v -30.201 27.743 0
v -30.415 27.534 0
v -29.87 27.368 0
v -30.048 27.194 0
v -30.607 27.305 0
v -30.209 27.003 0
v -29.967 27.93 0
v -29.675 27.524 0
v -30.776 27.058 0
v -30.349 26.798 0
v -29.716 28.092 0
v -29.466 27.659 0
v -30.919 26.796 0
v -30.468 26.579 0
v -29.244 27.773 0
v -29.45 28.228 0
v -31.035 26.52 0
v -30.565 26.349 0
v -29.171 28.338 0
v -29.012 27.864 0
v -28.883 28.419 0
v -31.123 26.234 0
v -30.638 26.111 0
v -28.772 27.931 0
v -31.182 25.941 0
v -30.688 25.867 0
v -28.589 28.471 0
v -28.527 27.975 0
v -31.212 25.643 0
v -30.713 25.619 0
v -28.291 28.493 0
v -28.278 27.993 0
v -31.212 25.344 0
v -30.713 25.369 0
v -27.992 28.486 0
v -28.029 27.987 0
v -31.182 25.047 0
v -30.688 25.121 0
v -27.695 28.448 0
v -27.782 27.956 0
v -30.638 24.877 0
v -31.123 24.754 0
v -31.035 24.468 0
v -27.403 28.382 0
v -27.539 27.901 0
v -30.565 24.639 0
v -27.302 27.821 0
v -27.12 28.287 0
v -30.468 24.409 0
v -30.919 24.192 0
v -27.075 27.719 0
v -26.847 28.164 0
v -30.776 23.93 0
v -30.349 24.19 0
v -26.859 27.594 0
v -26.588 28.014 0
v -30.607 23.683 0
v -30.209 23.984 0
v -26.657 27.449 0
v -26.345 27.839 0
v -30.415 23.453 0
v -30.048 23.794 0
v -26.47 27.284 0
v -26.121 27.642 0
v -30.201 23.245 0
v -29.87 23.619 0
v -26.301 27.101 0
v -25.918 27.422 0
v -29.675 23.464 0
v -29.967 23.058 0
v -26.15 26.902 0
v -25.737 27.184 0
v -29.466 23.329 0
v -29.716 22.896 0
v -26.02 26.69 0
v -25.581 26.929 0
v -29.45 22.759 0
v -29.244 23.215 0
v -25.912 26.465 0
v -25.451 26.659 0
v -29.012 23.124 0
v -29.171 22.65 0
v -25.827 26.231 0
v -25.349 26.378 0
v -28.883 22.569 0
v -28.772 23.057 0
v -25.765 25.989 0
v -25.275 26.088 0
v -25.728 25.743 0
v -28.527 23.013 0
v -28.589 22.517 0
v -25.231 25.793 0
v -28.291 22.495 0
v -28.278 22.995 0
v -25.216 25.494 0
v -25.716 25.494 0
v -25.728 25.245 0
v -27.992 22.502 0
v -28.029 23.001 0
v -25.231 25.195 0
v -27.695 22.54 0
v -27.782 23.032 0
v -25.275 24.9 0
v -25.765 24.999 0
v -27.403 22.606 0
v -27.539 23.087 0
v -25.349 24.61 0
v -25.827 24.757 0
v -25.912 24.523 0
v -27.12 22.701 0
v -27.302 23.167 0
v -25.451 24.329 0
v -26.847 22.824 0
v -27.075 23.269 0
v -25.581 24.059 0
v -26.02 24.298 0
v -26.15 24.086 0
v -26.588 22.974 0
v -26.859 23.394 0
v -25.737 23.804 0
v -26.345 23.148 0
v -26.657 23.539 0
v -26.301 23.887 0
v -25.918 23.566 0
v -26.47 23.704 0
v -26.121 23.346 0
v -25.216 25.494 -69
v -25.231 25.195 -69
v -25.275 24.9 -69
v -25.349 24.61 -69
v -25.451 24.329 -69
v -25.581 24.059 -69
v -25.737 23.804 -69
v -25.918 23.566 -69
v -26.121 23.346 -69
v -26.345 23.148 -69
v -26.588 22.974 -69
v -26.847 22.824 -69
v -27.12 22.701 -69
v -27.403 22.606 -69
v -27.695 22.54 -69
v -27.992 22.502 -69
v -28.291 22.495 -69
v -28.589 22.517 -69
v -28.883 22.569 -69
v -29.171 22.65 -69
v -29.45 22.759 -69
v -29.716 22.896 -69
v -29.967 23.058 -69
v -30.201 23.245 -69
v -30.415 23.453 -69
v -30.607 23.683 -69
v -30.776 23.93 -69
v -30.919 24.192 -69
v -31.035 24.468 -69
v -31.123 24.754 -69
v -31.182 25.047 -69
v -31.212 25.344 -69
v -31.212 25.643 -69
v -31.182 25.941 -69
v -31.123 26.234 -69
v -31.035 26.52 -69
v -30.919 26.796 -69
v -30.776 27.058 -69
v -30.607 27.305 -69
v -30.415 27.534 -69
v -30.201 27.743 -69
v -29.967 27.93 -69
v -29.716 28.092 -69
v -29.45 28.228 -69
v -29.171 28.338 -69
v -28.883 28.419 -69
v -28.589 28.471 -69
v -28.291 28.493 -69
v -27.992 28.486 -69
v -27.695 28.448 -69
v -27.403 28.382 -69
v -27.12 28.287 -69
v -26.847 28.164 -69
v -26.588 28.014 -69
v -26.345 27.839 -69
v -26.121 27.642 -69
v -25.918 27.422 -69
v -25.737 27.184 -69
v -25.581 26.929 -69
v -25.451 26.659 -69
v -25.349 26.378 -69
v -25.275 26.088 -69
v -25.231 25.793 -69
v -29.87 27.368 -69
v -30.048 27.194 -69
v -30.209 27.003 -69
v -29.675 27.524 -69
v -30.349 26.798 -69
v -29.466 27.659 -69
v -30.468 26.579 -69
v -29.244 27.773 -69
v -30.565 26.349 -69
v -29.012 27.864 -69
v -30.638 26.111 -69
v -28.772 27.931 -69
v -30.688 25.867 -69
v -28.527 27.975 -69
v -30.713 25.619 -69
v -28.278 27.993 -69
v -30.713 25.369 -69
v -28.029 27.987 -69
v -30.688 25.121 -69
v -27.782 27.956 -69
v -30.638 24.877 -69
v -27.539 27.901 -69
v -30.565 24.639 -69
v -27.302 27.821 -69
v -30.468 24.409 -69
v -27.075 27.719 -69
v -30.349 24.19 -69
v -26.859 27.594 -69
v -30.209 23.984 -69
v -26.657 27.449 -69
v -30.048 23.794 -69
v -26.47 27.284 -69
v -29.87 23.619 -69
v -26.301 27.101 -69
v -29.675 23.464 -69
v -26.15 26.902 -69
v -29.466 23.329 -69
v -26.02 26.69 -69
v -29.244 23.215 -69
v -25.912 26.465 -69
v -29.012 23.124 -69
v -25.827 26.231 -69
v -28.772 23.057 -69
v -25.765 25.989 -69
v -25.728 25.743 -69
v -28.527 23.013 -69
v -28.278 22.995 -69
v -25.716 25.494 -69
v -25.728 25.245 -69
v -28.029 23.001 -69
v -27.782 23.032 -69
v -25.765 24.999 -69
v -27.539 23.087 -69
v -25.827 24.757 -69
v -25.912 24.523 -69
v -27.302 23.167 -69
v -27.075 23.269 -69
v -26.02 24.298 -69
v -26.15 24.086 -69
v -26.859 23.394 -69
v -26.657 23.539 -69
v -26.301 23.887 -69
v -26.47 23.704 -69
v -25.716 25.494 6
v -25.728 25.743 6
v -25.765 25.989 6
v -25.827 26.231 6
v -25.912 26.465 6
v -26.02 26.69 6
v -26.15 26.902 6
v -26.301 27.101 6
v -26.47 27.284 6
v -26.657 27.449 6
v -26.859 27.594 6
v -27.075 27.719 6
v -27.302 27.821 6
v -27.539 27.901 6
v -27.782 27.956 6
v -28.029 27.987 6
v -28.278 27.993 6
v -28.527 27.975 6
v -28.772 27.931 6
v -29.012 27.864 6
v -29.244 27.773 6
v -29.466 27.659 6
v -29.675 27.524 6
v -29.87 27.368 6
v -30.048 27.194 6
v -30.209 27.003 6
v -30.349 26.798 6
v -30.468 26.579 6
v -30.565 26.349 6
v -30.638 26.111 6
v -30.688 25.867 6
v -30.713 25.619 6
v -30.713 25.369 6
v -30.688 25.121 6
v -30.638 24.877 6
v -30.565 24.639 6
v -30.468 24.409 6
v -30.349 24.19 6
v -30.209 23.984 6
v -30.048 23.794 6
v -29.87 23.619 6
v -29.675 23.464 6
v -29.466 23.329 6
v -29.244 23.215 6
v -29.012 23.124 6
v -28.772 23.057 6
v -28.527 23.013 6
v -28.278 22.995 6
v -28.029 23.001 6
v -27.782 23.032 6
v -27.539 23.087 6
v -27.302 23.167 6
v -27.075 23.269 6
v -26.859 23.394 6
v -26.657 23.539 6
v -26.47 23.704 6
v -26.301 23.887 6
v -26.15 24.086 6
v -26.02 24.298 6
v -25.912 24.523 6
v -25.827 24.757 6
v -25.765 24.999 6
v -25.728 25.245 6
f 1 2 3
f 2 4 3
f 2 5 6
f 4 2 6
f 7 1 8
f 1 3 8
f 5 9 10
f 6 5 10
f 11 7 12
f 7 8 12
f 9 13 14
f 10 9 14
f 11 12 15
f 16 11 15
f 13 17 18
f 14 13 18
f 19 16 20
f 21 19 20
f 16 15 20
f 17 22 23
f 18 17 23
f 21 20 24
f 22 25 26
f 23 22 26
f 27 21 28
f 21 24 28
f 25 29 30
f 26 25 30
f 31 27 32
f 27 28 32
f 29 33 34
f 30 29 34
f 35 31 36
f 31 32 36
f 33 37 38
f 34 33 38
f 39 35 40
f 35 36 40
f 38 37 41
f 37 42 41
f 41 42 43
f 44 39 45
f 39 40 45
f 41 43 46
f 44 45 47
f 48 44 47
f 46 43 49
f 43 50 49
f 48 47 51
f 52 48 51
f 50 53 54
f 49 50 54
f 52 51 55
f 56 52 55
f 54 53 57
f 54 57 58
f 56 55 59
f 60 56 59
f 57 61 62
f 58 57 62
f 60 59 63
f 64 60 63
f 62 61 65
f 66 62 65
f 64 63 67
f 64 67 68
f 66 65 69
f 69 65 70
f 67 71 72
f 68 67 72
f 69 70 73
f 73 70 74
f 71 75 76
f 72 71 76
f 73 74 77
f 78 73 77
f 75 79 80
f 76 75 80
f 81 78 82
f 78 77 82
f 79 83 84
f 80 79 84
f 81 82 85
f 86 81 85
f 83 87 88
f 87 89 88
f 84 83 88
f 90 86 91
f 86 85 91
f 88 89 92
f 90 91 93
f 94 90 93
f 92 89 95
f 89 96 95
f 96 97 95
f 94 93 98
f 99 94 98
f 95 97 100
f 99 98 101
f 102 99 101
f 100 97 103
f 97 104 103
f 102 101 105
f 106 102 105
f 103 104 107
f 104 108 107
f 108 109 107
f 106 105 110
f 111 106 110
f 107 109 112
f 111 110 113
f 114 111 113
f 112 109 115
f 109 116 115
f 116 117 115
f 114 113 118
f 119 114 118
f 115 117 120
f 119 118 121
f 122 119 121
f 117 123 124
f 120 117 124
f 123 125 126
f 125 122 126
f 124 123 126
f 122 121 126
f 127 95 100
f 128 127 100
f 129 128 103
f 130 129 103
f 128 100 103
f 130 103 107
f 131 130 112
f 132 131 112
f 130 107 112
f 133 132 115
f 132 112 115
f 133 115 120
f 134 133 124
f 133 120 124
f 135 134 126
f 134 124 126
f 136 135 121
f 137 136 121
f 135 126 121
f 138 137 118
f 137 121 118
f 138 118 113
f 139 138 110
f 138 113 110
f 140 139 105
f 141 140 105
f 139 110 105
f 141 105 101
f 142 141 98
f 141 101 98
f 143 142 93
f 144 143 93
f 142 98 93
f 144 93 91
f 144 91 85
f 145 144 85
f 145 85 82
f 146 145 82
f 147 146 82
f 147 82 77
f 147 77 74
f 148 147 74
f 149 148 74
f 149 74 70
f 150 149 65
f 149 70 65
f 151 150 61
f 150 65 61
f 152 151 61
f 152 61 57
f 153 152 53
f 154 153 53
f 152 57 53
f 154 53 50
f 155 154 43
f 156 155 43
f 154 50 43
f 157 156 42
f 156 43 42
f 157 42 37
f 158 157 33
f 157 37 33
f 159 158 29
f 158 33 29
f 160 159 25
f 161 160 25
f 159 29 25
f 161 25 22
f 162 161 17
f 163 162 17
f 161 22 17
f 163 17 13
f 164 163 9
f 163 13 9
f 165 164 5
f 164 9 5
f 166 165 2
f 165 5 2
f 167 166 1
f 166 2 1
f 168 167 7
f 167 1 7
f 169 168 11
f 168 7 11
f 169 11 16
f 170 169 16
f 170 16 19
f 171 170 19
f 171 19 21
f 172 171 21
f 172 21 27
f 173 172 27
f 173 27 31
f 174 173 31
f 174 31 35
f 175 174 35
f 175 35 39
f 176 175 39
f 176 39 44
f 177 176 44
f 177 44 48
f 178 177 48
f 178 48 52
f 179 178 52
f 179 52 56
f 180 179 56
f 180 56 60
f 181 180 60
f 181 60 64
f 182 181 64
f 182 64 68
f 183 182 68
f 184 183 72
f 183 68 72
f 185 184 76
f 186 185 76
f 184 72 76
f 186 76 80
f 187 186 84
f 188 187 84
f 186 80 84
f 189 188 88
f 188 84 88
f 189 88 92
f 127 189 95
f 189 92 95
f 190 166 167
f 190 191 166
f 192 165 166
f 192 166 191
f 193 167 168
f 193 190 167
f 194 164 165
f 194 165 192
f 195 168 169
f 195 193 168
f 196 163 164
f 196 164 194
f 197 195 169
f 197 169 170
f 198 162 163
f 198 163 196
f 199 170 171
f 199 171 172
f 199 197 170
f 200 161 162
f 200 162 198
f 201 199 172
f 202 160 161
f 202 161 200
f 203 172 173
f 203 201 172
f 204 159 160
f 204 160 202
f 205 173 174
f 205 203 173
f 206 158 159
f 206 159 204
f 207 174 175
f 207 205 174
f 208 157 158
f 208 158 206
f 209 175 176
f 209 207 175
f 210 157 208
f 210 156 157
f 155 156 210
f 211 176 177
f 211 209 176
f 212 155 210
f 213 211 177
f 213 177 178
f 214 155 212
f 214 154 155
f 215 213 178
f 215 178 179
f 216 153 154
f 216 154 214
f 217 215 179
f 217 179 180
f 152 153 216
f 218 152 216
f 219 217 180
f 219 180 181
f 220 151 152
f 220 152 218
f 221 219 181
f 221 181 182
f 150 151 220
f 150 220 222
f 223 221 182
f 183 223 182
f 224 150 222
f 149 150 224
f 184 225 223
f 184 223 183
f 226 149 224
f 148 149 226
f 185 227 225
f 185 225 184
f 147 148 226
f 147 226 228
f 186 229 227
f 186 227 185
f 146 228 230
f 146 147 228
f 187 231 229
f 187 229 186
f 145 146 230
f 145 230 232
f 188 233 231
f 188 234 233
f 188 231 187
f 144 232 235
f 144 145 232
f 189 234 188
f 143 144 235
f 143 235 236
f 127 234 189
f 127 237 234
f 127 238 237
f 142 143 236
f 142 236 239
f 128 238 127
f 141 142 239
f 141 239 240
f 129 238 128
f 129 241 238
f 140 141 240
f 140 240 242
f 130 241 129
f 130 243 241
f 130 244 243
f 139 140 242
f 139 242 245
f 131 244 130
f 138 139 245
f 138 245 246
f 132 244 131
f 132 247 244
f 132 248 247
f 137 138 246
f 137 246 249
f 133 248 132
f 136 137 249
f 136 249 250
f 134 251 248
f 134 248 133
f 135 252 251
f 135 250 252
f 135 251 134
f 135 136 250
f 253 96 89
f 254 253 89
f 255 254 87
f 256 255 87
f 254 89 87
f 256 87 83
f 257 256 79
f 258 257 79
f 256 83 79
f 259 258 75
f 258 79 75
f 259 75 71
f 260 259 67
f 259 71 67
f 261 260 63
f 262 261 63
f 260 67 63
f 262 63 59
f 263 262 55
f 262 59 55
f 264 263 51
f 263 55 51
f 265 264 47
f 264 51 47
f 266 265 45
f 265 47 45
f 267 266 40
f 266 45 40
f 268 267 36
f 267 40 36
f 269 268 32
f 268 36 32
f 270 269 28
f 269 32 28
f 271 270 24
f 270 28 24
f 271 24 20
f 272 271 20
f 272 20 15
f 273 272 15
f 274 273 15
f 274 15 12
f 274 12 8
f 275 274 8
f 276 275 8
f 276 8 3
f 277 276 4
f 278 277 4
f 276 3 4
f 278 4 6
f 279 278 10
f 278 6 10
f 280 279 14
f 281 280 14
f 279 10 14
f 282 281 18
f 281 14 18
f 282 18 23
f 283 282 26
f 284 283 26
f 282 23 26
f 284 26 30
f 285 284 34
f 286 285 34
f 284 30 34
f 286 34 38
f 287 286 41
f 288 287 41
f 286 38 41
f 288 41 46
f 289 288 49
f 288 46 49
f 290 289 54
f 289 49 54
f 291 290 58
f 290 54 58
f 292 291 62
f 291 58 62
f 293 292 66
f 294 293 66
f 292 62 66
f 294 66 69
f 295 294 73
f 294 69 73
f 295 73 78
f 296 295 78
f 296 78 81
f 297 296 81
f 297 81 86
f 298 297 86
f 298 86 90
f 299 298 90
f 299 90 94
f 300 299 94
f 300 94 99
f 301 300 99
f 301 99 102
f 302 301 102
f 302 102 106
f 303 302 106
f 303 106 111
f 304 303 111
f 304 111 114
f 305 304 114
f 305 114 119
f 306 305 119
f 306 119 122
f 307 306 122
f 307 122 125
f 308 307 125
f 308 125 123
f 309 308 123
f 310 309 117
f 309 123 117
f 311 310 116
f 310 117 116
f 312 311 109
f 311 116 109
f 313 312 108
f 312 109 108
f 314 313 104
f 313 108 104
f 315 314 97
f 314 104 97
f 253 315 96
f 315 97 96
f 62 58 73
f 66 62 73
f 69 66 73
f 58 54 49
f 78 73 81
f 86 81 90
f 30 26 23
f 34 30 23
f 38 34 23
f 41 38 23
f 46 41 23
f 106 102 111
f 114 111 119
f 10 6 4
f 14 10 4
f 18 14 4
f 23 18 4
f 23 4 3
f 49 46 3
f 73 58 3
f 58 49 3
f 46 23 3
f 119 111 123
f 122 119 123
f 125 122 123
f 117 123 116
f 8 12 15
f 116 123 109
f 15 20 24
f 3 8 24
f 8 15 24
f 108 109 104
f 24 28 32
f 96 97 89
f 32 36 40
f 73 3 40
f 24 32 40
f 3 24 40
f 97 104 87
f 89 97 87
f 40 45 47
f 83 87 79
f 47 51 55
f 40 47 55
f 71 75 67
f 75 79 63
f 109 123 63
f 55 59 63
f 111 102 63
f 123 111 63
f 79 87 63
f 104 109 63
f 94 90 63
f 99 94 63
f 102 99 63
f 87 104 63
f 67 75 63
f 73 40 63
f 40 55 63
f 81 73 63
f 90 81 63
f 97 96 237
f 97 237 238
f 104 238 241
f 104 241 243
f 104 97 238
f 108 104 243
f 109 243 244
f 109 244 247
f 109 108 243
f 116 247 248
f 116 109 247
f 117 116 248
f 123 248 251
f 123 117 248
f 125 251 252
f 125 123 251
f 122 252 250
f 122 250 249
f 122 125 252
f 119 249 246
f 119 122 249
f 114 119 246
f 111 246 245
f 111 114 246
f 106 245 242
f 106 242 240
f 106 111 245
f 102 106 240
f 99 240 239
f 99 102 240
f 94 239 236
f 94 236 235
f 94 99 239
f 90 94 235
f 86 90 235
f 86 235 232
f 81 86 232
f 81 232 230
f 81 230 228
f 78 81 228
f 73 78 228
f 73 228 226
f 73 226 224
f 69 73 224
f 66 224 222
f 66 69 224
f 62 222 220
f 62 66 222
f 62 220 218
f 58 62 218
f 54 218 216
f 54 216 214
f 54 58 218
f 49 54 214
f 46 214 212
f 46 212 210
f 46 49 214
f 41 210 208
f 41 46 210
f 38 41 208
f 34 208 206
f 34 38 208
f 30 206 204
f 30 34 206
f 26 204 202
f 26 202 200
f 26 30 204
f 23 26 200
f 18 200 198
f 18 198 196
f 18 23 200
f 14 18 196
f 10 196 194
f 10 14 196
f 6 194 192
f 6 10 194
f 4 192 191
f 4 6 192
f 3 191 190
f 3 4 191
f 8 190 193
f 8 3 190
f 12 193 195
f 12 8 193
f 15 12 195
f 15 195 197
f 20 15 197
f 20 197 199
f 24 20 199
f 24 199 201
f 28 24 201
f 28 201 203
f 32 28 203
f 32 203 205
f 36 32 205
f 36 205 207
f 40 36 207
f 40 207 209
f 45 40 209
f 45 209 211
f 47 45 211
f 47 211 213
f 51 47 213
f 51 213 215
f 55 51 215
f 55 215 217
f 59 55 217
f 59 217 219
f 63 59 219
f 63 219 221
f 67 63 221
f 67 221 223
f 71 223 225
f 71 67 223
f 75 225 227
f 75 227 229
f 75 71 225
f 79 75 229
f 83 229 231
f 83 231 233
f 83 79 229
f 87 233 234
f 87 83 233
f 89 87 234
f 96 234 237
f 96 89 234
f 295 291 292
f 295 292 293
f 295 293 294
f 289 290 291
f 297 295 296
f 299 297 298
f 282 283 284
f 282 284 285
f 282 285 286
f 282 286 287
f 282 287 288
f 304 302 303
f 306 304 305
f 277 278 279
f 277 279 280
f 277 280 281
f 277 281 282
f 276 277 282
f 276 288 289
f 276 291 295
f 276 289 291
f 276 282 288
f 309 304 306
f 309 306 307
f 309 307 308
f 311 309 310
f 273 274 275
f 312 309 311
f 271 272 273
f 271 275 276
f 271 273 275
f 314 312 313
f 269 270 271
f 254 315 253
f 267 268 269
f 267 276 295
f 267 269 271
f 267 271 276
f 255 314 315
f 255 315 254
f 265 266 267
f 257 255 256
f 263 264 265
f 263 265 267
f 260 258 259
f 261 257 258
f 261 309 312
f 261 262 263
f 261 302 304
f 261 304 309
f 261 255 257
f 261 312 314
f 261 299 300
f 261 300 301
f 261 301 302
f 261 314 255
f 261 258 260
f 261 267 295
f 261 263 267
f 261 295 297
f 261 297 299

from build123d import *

# Parameters (mm, degrees)
F0_R     = 2.5
F1_DEPTH = 6
F2_R     = 3
F2_R_2   = 2.5
F3_DEPTH = 69


with BuildPart() as f1:
    # F0 (on Top) → F1 (new body)
    with BuildSketch(Plane.XY):
        with Locations((-28.215727, 25.493953)):
            Circle(F0_R)
    extrude(amount=F1_DEPTH)


with BuildPart() as f3:
    # F2 (on face) → F3 (new body)
    with BuildSketch(Plane(origin=(0, 0, 0), x_dir=(1, 0, 0), z_dir=(0, 0, -1))):
        with Locations((-28.215727, -25.493953)):
            Circle(F2_R)
        with Locations((-28.215727, -25.493953)):
            Circle(F2_R_2, mode=Mode.SUBTRACT)
    extrude(amount=F3_DEPTH)


solid = Compound([f1.part, f3.part])
